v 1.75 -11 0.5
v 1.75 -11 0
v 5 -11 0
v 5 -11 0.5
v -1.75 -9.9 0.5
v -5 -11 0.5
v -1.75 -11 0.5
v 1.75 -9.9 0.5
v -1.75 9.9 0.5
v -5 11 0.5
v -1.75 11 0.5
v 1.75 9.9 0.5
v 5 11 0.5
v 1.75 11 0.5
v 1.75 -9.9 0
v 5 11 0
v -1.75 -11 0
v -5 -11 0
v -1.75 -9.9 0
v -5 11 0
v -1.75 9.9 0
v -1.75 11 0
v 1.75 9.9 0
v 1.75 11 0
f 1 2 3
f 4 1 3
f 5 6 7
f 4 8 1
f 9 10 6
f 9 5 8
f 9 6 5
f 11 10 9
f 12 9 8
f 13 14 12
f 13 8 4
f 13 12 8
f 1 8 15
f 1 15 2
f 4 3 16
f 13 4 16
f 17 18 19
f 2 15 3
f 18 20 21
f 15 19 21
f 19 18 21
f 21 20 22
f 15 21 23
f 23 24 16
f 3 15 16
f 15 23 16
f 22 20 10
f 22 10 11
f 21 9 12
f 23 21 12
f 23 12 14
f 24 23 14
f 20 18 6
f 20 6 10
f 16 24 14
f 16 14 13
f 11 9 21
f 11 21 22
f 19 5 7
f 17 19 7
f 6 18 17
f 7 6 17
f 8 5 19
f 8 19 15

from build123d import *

# Parameters (mm, degrees)
SKETCH2_W           = 10
SKETCH2_H           = 22
BOSS_EXTRUDE1_DEPTH = 0.5
SKETCH4_W           = 3.5
SKETCH4_H           = 1.1
CUT_EXTRUDE1_DEPTH  = 13.093386622


with BuildPart() as part:
    # Sketch2 → Boss-Extrude1 (new body)
    with BuildSketch(Plane.XY):
        Rectangle(SKETCH2_W, SKETCH2_H)
    extrude(amount=BOSS_EXTRUDE1_DEPTH)

    # Sketch4 → Cut-Extrude1 (cut, through all)
    with BuildSketch(Plane.XY.offset(0.5)):
        with Locations((0, 10.45)):
            Rectangle(SKETCH4_W, SKETCH4_H)
    cut_extrude1 = extrude(amount=-CUT_EXTRUDE1_DEPTH, mode=Mode.SUBTRACT)

    # Mirror2: Cut-Extrude1 across plane
    add(cut_extrude1.mirror(Plane.ZX), mode=Mode.SUBTRACT)


solid = part.part
